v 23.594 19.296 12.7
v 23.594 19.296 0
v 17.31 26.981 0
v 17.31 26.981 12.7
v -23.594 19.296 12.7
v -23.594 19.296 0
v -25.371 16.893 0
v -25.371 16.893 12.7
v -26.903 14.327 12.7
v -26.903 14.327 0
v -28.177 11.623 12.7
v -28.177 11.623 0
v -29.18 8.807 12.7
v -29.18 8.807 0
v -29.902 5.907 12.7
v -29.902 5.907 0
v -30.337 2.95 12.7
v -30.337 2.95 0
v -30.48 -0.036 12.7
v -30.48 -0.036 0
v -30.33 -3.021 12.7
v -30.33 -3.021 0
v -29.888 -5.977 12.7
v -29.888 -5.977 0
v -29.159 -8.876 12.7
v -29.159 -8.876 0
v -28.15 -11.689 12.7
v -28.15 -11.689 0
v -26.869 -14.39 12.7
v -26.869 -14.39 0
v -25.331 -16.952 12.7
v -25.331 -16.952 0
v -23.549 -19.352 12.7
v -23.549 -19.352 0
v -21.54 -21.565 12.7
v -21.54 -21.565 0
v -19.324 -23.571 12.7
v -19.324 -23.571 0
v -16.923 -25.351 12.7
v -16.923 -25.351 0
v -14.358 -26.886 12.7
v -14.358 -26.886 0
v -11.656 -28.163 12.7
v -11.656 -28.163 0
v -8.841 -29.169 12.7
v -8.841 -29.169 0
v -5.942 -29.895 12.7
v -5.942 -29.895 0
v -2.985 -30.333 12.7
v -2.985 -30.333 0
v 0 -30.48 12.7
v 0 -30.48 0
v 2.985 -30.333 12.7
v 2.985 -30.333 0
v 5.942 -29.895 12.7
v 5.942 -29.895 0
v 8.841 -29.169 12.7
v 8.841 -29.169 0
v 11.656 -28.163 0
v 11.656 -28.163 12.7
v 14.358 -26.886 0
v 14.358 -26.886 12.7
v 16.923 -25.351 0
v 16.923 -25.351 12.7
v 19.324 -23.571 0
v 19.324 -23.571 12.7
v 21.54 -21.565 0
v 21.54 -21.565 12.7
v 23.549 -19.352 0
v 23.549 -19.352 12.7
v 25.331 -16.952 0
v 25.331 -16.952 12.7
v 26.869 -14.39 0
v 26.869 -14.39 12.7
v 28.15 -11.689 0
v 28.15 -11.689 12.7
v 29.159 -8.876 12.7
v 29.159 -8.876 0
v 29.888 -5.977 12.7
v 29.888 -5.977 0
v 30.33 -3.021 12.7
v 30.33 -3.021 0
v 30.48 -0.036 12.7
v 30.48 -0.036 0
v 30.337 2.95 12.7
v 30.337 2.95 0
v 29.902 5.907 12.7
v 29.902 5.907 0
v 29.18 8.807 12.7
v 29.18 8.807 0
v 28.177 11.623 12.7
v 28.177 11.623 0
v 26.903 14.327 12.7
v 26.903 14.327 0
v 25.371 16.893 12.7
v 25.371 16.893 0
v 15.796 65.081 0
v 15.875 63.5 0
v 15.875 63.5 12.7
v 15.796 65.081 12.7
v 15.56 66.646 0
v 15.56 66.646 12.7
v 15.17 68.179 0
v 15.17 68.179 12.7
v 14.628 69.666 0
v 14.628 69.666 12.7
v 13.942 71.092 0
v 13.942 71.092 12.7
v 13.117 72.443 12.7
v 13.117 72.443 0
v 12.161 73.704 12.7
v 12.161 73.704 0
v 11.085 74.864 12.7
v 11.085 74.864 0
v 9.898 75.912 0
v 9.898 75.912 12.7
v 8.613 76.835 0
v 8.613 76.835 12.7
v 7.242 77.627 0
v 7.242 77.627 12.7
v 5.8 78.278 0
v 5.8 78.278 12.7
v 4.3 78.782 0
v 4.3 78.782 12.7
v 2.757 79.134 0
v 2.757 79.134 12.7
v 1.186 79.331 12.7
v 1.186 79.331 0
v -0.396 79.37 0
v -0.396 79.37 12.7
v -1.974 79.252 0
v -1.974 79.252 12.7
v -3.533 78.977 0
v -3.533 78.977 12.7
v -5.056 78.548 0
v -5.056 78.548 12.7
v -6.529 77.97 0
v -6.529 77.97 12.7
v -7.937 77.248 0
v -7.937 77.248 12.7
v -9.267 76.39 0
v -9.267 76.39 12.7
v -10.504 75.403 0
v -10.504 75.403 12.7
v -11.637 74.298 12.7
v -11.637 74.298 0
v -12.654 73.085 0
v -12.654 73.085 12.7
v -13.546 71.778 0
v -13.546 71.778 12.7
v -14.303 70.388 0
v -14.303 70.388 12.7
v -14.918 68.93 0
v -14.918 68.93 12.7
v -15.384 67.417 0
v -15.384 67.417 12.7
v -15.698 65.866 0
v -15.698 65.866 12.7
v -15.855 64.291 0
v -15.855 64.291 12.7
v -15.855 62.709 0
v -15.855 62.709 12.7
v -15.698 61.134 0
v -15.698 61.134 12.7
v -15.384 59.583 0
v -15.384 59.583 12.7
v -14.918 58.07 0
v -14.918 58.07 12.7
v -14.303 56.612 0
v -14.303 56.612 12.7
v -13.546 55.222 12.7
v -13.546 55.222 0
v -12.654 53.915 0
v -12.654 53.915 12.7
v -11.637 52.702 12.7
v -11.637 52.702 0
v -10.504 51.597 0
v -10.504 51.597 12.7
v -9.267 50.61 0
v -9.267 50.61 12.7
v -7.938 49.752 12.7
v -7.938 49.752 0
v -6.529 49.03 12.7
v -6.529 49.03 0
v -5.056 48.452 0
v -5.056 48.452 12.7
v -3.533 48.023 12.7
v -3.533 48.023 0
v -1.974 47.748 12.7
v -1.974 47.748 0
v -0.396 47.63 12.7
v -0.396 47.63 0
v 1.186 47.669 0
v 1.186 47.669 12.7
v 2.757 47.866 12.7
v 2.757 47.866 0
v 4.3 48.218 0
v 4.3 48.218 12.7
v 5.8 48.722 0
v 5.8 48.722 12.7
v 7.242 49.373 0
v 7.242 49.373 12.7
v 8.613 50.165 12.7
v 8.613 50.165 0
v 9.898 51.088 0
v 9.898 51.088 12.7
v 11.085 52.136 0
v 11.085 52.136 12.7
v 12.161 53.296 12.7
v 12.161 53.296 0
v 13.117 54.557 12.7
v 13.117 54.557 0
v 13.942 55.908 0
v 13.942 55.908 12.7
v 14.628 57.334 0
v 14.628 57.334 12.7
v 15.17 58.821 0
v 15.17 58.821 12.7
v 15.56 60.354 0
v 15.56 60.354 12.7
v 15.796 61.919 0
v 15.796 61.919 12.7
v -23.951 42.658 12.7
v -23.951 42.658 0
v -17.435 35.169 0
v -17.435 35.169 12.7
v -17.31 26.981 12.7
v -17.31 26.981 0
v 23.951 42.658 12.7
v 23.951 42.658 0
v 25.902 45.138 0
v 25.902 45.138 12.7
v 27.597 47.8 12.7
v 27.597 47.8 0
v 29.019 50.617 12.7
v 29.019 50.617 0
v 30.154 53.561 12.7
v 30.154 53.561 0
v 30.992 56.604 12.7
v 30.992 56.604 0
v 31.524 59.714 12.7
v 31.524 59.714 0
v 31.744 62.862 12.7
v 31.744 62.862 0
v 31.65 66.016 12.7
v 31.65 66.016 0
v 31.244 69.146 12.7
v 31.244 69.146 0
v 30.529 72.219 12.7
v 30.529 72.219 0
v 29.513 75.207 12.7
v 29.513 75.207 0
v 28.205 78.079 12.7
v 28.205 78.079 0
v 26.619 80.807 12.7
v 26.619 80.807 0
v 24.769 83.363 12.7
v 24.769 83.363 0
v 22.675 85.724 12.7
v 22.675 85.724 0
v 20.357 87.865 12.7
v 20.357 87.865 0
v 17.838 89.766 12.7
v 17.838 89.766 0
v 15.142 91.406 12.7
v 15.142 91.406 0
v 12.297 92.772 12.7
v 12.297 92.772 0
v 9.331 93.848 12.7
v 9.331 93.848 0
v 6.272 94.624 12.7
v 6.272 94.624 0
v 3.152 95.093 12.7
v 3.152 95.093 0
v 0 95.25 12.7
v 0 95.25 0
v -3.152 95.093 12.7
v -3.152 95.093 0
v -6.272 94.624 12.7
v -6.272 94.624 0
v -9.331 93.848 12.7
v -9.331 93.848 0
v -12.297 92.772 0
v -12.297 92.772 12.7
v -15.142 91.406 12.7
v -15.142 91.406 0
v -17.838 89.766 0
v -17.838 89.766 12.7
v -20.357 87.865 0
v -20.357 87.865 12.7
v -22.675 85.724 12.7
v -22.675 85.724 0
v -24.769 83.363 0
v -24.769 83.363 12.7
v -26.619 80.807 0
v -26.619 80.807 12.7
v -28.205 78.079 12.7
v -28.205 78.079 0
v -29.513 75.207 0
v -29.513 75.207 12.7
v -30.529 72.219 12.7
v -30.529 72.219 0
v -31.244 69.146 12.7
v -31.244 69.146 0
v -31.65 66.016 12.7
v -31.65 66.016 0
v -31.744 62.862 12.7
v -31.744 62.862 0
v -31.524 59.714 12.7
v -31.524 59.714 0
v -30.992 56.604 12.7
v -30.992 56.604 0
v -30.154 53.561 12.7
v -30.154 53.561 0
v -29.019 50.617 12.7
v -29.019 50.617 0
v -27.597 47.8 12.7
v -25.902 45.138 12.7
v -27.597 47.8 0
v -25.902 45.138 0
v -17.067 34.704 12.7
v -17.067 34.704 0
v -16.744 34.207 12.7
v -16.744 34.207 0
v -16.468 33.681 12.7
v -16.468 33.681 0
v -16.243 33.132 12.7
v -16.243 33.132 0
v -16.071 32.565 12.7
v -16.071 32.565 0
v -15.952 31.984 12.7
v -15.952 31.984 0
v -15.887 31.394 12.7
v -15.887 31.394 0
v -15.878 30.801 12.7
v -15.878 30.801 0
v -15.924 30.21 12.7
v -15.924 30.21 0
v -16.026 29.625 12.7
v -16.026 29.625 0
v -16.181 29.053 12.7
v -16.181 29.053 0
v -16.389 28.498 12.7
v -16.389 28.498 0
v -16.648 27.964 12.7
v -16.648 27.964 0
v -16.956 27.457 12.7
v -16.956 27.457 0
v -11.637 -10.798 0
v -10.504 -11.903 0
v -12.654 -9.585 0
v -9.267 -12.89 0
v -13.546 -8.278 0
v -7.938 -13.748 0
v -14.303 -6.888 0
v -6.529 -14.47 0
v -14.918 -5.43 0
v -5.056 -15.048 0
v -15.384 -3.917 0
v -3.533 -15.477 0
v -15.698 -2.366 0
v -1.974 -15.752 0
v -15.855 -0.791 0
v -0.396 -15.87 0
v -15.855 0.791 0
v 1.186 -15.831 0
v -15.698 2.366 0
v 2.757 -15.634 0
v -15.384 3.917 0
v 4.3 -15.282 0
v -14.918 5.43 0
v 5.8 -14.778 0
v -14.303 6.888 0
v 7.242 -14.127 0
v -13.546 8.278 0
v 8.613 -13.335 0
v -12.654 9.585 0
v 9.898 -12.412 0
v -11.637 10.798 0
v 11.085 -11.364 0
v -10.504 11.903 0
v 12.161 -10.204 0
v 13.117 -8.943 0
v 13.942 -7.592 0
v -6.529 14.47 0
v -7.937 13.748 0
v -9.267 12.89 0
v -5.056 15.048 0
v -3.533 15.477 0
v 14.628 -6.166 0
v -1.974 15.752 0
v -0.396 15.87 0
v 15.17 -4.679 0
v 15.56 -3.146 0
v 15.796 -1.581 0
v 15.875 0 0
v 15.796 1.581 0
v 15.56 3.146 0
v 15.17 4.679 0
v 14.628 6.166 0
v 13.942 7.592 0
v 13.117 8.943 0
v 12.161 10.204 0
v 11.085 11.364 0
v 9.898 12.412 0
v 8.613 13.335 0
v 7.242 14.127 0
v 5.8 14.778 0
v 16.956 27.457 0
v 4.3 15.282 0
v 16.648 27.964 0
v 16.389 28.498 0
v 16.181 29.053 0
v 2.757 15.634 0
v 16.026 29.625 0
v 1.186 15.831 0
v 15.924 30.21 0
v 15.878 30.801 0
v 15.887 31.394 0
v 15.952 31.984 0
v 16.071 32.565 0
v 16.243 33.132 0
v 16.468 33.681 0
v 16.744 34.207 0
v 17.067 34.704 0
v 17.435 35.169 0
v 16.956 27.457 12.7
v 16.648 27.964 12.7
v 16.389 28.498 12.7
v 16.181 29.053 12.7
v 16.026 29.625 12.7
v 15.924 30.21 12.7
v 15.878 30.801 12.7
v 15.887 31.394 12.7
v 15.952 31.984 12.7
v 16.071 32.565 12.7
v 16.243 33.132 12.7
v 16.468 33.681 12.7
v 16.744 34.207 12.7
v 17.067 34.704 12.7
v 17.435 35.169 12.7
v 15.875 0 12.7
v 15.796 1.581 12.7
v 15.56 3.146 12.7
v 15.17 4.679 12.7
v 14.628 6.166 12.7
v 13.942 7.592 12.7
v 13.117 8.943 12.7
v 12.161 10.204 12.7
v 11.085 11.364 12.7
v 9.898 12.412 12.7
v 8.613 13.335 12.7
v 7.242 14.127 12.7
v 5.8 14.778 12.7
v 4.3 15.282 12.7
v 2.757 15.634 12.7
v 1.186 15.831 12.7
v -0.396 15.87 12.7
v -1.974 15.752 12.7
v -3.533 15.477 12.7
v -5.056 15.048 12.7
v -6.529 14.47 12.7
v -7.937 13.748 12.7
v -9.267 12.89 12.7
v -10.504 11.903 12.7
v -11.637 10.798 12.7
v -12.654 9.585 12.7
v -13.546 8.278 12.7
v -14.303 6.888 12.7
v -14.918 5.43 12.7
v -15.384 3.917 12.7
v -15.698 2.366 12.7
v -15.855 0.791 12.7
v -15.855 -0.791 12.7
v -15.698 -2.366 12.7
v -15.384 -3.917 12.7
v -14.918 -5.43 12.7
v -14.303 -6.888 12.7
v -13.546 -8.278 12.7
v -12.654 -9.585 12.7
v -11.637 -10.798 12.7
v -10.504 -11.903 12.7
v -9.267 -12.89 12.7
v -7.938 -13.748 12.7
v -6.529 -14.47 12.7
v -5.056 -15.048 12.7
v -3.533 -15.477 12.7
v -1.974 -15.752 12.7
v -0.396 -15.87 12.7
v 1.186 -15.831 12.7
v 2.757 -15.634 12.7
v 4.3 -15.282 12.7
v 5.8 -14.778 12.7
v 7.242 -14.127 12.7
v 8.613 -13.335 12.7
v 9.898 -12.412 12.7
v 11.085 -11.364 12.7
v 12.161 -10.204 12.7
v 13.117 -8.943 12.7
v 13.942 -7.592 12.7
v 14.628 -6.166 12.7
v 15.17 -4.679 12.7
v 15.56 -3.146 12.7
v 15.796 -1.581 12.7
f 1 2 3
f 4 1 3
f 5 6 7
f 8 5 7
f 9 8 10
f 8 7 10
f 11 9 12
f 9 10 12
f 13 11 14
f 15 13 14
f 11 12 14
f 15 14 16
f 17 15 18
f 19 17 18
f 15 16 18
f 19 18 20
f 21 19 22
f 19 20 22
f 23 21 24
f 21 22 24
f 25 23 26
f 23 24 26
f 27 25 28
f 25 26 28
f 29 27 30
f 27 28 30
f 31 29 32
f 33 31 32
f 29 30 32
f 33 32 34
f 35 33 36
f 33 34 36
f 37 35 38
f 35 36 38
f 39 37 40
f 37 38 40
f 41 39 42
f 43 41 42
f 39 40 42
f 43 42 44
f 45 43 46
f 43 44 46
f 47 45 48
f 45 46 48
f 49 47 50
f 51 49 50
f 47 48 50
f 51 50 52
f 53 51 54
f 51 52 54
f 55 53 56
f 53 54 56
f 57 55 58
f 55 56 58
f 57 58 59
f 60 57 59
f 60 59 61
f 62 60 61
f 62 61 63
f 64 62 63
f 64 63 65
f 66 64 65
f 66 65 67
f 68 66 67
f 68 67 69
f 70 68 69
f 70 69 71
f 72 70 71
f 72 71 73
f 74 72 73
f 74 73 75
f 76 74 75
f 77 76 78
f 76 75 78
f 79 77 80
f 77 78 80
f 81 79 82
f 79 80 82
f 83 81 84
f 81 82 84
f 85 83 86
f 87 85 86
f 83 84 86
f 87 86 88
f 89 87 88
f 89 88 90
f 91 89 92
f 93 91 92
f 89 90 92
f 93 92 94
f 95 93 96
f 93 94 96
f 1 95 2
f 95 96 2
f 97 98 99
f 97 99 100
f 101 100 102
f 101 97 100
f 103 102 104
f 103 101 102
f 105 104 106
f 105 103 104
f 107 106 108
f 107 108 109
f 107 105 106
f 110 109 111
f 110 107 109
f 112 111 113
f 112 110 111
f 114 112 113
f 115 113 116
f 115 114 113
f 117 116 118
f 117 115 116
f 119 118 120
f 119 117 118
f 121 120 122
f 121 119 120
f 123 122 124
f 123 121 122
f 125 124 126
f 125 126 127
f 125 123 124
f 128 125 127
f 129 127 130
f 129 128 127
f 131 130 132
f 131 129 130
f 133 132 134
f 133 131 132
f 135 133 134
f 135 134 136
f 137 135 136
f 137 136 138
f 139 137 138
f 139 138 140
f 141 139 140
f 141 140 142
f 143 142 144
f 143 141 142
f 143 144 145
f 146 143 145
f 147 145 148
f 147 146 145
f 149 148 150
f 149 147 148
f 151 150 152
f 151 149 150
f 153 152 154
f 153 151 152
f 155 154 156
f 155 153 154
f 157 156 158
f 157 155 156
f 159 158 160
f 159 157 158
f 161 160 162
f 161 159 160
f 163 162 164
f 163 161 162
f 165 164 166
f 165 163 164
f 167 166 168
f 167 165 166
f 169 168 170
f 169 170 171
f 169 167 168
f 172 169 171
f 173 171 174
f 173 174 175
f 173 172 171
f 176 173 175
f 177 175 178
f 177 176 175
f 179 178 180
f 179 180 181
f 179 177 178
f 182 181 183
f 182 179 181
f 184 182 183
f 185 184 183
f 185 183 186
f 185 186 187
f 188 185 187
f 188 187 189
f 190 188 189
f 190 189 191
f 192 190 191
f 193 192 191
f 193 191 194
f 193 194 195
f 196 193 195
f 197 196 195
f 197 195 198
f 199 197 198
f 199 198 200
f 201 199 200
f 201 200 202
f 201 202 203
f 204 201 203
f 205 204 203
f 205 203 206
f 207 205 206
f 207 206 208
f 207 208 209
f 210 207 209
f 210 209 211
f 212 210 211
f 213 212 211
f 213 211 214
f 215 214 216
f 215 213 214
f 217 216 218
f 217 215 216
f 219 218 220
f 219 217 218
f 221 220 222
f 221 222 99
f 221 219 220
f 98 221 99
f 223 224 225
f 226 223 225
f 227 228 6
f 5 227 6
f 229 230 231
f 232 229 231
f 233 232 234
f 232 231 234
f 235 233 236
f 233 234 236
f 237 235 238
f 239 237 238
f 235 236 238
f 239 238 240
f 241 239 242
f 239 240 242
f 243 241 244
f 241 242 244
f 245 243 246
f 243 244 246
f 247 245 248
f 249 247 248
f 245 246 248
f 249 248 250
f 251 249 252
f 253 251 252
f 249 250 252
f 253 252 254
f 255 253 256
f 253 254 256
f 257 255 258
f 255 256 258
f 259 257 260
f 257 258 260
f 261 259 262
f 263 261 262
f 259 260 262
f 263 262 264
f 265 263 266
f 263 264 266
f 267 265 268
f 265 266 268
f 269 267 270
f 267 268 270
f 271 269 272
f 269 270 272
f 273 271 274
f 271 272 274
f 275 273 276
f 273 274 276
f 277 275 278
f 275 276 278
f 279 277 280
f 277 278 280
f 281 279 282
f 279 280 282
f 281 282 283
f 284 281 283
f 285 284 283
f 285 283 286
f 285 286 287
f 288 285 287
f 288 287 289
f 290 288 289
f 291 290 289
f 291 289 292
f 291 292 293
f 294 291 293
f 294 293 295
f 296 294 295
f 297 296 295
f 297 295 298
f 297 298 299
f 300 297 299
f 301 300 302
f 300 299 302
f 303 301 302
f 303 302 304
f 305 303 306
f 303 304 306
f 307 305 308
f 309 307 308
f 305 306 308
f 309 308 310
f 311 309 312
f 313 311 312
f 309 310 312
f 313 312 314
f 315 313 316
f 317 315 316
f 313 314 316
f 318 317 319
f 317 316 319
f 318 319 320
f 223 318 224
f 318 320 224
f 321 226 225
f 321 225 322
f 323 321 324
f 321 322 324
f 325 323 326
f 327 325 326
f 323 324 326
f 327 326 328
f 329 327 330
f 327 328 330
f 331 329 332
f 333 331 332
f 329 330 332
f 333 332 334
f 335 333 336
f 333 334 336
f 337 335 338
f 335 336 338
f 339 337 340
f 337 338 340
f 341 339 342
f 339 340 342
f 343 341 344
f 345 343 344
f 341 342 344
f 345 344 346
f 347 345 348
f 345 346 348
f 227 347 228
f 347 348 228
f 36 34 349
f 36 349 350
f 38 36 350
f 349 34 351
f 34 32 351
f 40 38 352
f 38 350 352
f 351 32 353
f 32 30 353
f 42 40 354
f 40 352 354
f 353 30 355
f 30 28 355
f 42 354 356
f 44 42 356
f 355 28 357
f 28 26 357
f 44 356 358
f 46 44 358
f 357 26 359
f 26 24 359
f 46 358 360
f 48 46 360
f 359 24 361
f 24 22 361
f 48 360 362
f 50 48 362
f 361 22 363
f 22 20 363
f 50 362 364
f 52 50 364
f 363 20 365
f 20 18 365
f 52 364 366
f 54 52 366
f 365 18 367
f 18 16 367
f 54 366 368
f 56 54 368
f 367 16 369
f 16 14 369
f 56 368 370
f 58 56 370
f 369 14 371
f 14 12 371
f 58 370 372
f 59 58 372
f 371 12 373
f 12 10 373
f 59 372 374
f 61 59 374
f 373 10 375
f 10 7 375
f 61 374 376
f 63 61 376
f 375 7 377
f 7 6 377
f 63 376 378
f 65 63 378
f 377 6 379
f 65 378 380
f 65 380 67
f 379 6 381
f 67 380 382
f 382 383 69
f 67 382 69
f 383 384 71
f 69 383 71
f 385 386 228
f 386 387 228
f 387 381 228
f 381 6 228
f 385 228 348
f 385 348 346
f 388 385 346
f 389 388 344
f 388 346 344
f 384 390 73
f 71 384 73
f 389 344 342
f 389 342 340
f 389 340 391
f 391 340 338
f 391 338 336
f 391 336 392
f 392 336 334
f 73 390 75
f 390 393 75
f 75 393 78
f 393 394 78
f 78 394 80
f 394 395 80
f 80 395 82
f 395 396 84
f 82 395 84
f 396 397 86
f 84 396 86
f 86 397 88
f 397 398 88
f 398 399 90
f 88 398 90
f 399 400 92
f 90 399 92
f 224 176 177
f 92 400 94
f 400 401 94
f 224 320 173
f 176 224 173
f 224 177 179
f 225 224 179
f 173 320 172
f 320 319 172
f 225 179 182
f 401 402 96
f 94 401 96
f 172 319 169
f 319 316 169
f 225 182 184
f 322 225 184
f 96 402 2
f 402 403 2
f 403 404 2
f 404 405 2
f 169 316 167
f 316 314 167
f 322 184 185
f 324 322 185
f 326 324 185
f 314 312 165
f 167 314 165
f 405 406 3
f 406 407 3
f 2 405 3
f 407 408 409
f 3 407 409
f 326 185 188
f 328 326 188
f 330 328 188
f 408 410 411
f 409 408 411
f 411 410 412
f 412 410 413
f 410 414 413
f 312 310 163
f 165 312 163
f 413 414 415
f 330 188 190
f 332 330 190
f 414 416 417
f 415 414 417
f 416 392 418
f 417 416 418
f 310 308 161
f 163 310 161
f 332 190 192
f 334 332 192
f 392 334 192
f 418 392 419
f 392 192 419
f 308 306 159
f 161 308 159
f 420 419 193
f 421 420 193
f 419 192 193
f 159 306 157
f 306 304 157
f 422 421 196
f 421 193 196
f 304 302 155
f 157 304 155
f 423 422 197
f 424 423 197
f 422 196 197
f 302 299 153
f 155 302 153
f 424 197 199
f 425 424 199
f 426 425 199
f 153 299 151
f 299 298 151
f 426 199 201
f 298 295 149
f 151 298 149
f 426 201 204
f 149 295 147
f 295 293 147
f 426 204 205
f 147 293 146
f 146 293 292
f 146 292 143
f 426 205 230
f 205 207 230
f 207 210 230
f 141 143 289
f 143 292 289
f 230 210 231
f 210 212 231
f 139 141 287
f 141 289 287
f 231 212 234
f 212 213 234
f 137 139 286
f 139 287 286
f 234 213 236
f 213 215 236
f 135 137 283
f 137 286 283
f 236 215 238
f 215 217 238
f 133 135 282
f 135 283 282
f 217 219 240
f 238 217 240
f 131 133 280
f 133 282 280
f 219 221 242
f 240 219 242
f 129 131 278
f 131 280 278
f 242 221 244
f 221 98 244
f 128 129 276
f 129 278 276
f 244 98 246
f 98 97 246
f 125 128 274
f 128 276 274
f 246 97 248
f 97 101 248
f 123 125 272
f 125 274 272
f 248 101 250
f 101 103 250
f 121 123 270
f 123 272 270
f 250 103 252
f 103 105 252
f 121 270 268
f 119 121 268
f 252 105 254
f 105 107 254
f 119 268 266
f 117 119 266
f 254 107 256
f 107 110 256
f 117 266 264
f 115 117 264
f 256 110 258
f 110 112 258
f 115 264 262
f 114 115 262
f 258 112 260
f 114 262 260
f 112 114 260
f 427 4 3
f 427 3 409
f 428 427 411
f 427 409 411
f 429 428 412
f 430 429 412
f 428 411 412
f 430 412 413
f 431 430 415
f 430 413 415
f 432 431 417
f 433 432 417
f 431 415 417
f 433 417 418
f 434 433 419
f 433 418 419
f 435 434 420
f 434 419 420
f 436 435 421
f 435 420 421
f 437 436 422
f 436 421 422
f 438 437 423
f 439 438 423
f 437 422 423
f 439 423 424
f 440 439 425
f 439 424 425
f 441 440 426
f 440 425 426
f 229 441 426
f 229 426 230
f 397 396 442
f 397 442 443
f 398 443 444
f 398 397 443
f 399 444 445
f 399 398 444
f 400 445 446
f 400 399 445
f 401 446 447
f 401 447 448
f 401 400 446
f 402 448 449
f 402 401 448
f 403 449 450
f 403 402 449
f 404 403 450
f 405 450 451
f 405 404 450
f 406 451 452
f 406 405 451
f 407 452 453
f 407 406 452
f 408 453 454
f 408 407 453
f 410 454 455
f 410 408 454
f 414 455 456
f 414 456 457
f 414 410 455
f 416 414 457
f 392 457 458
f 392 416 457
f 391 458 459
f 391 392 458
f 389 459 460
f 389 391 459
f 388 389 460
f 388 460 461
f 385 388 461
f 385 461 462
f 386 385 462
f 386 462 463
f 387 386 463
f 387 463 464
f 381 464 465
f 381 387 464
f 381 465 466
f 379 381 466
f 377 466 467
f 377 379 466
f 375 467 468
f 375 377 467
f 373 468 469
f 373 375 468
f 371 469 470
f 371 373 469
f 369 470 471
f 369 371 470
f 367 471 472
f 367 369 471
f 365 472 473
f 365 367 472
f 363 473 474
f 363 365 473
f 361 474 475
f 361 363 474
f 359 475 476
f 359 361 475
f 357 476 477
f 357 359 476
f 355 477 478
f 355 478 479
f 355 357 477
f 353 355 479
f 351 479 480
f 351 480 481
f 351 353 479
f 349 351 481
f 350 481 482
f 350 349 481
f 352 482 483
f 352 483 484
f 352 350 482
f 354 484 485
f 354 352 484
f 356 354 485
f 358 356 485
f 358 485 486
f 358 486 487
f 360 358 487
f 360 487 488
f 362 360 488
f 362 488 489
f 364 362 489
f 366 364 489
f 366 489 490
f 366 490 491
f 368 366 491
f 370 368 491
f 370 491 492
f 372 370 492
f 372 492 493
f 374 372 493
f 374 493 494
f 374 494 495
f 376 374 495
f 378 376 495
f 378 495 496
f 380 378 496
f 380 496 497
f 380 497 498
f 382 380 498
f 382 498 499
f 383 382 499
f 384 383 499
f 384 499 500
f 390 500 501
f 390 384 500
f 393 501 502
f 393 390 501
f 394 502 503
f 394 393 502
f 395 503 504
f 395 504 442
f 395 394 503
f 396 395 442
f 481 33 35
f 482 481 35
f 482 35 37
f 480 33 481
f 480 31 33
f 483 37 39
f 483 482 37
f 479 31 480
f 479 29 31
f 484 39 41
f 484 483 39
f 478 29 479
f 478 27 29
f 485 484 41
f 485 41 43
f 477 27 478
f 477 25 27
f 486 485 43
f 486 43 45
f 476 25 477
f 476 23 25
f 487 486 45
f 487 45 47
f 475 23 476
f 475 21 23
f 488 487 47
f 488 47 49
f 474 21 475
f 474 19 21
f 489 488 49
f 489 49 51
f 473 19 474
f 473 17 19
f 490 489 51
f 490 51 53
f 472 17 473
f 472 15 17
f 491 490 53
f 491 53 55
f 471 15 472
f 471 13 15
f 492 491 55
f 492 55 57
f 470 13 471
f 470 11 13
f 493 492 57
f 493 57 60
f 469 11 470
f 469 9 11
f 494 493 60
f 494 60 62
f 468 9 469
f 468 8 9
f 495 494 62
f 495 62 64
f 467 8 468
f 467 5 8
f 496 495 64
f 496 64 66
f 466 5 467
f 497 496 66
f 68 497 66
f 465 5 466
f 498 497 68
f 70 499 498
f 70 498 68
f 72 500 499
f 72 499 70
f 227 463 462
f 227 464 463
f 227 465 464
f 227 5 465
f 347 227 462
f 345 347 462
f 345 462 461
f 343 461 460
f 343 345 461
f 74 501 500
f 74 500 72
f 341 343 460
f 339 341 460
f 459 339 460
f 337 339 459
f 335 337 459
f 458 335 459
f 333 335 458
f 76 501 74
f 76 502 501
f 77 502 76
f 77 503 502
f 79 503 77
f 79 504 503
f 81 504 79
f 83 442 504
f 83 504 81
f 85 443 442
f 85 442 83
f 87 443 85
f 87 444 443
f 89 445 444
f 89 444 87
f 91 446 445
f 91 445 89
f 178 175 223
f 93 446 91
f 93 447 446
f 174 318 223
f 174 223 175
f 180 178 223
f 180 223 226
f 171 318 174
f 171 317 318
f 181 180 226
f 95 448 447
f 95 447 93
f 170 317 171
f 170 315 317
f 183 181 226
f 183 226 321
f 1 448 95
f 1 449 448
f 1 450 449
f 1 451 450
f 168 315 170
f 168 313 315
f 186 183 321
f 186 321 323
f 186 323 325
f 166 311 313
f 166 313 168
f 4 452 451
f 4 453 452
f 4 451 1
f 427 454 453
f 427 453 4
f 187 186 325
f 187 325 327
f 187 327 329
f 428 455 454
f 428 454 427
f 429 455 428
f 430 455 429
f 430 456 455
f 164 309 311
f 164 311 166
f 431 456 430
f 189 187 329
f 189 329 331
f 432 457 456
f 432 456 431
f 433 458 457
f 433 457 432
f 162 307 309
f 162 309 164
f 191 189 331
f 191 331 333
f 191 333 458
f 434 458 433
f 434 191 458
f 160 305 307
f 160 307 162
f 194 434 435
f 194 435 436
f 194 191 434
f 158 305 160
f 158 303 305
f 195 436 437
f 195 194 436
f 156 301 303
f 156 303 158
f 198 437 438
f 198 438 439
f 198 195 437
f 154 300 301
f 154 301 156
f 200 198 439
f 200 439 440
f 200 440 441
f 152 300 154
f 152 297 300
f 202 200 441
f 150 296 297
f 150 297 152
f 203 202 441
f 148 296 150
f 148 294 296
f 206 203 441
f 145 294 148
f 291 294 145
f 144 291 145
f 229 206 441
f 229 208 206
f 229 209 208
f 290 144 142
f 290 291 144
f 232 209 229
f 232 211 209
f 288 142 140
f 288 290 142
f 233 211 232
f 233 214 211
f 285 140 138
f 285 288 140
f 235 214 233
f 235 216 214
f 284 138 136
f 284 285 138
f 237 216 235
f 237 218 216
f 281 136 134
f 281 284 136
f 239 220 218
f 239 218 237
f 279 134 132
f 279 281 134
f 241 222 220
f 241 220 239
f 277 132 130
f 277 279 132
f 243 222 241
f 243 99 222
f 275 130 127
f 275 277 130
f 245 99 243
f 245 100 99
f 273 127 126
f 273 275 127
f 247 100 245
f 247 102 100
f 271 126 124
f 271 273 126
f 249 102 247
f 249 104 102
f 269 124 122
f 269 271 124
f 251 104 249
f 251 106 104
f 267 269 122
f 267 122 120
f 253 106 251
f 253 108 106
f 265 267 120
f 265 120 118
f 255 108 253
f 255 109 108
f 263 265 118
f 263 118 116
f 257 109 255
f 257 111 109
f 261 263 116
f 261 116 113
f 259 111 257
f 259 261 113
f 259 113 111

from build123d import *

# Parameters (mm, degrees)
SKETCH1_R           = 15.875
BOSS_EXTRUDE1_DEPTH = 12.7


with BuildPart() as part:
    # Sketch1 → Boss-Extrude1 (new body)
    with BuildSketch(Plane.XY):
        with BuildLine():
            Line((17.434741505, 35.16914378), (23.951292477, 42.6577811))
            ThreePointArc((23.951292477, 42.6577811), (0, 95.25), (-23.951292477, 42.6577811))
            Line((-23.951292477, 42.6577811), (-17.434741505, 35.16914378))
            ThreePointArc((-17.434741505, 35.16914378), (-15.875741954, 31.097768382), (-17.309554442, 26.980638438))
            Line((-17.309554442, 26.980638438), (-23.594138681, 19.296295497))
            ThreePointArc((-23.594138681, 19.296295497), (0, -30.48), (23.594138681, 19.296295497))
            Line((23.594138681, 19.296295497), (17.309554442, 26.980638438))
            ThreePointArc((17.309554442, 26.980638438), (15.875741954, 31.097768382), (17.434741505, 35.16914378))
        make_face()
        with Locations((0, 63.5)):
            Circle(SKETCH1_R, mode=Mode.SUBTRACT)
        Circle(SKETCH1_R, mode=Mode.SUBTRACT)
    extrude(amount=BOSS_EXTRUDE1_DEPTH)


solid = part.part
